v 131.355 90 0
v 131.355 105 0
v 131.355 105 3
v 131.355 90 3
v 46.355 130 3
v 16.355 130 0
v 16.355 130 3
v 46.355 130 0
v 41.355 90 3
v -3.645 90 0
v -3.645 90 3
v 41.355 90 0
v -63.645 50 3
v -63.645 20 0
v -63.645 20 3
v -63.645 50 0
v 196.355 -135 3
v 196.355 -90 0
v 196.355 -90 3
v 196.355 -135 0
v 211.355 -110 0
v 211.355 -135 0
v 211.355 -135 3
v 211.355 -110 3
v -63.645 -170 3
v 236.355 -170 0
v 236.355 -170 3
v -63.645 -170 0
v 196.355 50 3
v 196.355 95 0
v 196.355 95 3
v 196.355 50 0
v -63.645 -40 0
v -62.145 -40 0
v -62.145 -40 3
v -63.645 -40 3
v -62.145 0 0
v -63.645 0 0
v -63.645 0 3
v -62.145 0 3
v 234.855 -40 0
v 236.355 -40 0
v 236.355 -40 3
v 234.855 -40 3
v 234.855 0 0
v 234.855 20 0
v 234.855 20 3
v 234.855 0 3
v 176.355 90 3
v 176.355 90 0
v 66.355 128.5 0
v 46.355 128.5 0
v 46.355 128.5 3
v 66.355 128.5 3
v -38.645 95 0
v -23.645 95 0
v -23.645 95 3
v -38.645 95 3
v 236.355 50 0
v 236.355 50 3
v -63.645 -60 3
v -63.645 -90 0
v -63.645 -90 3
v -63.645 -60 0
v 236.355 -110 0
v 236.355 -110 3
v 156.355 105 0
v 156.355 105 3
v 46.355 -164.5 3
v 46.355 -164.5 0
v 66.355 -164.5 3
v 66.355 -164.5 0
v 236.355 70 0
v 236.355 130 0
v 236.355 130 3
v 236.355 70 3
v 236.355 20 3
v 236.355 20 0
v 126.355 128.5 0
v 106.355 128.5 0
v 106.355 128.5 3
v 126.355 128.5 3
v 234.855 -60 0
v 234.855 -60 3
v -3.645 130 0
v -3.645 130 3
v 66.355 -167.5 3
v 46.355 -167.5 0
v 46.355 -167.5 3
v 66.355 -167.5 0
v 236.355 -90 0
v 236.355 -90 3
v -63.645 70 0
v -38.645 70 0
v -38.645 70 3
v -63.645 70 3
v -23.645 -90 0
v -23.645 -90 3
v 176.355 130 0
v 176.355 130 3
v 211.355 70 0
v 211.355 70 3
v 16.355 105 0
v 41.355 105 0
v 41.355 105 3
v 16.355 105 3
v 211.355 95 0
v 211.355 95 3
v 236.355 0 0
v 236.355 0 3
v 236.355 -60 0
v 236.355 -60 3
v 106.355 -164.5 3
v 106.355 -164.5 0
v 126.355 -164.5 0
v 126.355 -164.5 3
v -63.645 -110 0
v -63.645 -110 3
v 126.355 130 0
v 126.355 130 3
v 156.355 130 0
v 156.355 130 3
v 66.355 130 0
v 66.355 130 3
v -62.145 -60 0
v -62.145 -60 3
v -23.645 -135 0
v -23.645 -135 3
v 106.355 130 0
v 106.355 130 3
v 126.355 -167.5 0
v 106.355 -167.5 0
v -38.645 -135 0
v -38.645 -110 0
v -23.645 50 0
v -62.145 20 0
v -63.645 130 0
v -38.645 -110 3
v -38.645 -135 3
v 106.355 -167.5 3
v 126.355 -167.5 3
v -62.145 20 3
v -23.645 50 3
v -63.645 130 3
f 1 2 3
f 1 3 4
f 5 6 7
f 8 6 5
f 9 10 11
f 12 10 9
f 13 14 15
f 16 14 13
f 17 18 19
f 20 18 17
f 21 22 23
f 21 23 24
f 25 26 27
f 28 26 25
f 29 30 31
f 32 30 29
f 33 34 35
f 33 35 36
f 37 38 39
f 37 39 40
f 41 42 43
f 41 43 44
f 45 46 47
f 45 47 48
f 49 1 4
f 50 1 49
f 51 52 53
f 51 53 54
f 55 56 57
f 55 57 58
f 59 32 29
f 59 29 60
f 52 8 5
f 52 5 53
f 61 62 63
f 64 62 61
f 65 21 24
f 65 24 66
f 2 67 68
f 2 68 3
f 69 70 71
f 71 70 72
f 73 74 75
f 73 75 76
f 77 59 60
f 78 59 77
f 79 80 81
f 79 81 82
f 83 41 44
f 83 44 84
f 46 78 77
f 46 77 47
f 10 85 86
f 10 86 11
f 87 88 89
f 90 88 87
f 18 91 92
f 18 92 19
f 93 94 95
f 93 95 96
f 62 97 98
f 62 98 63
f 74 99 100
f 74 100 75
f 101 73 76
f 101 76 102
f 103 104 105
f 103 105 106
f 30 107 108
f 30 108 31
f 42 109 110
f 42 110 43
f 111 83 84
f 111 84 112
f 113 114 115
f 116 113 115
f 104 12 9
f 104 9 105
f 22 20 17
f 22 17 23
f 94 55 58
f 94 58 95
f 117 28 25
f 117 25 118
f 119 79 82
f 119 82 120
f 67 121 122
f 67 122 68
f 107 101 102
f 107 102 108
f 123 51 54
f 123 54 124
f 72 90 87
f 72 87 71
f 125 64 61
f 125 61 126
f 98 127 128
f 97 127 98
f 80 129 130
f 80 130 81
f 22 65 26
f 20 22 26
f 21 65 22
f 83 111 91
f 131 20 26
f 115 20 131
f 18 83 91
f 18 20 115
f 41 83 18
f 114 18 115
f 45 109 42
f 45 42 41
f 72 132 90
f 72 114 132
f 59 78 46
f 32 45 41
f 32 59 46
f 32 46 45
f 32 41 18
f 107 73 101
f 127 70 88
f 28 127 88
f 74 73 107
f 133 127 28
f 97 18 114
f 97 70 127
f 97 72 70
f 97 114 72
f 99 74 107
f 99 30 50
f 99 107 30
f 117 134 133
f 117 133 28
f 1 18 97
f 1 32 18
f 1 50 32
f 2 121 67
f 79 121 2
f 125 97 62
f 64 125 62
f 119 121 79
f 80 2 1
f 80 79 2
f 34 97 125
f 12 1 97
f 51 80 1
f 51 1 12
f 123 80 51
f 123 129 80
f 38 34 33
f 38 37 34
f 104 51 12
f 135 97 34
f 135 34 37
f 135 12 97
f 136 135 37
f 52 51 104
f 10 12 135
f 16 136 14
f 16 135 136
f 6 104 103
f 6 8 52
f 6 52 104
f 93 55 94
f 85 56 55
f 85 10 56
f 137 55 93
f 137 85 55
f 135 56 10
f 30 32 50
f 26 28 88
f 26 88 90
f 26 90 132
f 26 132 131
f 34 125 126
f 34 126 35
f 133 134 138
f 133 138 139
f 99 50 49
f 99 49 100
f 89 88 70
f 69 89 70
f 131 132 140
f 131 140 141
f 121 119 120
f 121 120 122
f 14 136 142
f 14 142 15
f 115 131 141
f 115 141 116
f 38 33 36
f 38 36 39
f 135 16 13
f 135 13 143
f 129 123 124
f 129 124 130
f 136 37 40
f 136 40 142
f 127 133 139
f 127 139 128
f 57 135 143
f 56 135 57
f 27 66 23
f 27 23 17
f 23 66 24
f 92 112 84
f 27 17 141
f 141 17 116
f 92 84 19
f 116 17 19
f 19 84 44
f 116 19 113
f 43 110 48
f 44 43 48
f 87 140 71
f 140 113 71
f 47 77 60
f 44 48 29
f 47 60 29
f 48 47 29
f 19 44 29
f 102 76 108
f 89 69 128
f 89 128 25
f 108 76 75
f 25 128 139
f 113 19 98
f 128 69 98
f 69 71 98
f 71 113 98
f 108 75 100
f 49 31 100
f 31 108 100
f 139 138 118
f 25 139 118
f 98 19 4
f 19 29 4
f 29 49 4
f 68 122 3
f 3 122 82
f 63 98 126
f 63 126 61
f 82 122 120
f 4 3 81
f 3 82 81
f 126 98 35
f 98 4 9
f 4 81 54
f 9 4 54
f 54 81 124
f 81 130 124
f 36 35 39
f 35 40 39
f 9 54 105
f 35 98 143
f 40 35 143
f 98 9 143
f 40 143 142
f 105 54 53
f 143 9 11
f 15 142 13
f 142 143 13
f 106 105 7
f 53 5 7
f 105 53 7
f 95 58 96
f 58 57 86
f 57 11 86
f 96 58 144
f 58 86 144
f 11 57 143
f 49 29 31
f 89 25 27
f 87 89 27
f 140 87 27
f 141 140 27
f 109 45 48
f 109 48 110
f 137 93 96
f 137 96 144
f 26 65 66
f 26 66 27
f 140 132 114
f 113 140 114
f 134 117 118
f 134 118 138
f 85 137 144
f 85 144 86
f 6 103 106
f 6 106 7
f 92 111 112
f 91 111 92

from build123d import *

# Parameters (mm, degrees)
ESBO_O2_W                = 20
ESBO_O2_H                = 3
RESSALTO_EXTRUS_O1_DEPTH = 3


with BuildPart() as part:
    # Esboço2 → Ressalto-extrusão1 (new body)
    with BuildSketch(Plane.XY):
        Polygon((-63.645119203, -170), (-63.645119203, -110), (-38.645119203, -110), (-38.645119203, -135), (-23.645119203, -135), (-23.645119203, -90), (-63.645119203, -90), (-63.645119203, -60), (-62.145119203, -60), (-62.145119203, -40), (-63.645119203, -40), (-63.645119203, 0), (-62.145119203, 0), (-62.145119203, 20), (-63.645119203, 20), (-63.645119203, 50), (-23.645119203, 50), (-23.645119203, 95), (-38.645119203, 95), (-38.645119203, 70), (-63.645119203, 70), (-63.645119203, 130), (-3.645119203, 130), (-3.645119203, 90), (41.354880797, 90), (41.354880797, 105), (16.354880797, 105), (16.354880797, 130), (46.354880797, 130), (46.354880797, 128.5), (66.354880797, 128.5), (66.354880797, 130), (106.354880797, 130), (106.354880797, 128.5), (126.354880797, 128.5), (126.354880797, 130), (156.354880797, 130), (156.354880797, 105), (131.354880797, 105), (131.354880797, 90), (176.354880797, 90), (176.354880797, 130), (236.354880797, 130), (236.354880797, 70), (211.354880797, 70), (211.354880797, 95), (196.354880797, 95), (196.354880797, 50), (236.354880797, 50), (236.354880797, 20), (234.854880797, 20), (234.854880797, 0), (236.354880797, 0), (236.354880797, -40), (234.854880797, -40), (234.854880797, -60), (236.354880797, -60), (236.354880797, -90), (196.354880797, -90), (196.354880797, -135), (211.354880797, -135), (211.354880797, -110), (236.354880797, -110), (236.354880797, -170), align=None)
        with Locations((56.354880797, -166)):
            Rectangle(ESBO_O2_W, ESBO_O2_H, mode=Mode.SUBTRACT)
        with Locations((116.354880797, -166)):
            Rectangle(ESBO_O2_W, ESBO_O2_H, mode=Mode.SUBTRACT)
    extrude(amount=RESSALTO_EXTRUS_O1_DEPTH)


solid = part.part
